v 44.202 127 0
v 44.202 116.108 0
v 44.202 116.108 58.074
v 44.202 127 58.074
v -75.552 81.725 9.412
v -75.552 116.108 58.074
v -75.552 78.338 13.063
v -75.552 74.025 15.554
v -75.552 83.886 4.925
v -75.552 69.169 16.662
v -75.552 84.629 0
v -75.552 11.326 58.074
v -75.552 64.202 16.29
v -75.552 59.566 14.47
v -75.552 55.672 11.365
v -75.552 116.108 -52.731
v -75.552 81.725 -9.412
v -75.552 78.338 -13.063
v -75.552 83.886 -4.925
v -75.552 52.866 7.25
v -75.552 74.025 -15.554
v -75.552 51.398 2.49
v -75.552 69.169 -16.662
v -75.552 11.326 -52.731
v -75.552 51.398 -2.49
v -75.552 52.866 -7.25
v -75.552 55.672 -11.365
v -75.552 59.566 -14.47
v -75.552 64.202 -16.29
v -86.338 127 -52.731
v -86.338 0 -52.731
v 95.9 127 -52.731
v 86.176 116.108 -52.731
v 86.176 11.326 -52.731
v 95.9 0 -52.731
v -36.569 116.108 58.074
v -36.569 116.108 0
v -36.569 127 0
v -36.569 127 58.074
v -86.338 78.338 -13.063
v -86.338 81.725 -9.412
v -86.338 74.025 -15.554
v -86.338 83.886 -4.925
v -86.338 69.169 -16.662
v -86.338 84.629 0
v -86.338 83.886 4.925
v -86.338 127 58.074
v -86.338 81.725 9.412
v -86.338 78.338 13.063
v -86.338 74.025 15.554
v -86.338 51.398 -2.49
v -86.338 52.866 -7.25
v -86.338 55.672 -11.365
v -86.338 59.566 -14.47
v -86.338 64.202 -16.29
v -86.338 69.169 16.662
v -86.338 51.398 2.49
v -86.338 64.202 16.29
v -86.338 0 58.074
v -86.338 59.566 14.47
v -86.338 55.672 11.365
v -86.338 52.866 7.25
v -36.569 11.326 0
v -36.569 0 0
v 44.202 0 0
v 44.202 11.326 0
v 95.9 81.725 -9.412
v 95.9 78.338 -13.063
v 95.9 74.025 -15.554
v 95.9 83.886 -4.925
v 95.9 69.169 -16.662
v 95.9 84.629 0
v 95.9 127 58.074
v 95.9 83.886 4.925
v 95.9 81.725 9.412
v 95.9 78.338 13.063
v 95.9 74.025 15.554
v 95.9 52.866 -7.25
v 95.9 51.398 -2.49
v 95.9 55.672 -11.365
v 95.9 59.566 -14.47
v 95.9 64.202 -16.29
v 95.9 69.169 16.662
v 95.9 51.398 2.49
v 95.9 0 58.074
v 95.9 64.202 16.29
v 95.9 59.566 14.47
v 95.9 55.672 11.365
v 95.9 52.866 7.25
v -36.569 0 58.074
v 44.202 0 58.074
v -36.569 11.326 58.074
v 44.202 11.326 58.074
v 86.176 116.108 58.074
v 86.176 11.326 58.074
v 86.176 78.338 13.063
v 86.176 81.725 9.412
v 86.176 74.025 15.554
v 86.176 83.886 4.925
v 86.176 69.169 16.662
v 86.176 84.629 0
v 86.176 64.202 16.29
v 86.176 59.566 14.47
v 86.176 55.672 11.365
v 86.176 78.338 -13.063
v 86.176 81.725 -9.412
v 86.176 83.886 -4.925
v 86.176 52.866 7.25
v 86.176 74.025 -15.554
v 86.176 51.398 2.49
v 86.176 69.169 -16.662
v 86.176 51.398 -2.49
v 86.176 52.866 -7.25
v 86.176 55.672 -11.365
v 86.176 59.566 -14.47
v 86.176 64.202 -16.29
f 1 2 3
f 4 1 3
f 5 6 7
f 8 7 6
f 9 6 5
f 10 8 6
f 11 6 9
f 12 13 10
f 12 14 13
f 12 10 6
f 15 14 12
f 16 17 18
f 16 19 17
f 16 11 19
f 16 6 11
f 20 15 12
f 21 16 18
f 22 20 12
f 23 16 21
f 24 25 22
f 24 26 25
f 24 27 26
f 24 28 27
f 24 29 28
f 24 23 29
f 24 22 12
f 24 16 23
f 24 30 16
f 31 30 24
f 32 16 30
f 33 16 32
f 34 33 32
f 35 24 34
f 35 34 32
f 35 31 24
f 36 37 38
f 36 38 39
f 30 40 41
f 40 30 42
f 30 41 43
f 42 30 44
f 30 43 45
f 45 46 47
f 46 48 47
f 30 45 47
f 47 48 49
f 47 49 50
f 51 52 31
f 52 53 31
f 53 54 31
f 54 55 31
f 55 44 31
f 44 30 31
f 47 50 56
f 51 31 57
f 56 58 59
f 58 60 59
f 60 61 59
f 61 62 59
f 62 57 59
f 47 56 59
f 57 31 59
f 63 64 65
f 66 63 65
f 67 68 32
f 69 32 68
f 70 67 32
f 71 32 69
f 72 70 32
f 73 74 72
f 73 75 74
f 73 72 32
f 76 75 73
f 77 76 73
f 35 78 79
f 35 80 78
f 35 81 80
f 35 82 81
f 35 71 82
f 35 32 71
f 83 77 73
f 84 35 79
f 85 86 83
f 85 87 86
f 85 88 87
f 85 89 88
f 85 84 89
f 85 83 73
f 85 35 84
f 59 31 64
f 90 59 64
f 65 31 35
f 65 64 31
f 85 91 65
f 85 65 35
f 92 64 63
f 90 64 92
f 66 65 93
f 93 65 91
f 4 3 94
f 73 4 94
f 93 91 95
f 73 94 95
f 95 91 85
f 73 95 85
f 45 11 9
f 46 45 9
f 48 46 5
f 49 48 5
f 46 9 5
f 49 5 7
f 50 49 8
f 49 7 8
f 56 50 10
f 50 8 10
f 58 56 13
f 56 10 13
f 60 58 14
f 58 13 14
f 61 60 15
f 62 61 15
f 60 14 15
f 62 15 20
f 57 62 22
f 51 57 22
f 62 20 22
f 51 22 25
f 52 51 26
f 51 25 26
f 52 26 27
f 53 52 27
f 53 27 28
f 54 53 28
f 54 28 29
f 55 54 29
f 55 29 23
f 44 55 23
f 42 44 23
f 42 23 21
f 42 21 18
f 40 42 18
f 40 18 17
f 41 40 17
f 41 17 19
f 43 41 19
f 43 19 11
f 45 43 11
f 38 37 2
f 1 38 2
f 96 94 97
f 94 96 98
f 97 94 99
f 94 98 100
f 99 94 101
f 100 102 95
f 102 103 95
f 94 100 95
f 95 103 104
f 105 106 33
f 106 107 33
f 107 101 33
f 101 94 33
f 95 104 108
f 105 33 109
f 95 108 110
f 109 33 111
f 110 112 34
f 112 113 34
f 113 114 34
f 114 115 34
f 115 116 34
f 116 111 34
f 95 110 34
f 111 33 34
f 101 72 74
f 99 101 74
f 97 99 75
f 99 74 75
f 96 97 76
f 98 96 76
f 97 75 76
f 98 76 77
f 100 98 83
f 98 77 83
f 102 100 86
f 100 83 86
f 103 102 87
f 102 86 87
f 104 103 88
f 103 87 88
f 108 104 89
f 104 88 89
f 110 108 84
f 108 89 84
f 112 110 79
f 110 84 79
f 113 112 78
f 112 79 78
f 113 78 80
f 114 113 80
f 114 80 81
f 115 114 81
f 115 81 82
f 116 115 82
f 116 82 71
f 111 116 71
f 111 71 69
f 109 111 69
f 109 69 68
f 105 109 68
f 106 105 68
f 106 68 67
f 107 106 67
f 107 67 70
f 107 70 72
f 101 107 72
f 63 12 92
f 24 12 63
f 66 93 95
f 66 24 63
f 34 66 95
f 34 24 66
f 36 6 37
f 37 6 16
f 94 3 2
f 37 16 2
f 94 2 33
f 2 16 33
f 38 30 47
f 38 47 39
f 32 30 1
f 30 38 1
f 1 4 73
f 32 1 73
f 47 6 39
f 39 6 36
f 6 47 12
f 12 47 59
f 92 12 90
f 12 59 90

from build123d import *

# Parameters (mm, degrees)
F0_W     = 182.2371855378
F0_H     = 110.8047105372
F1_DEPTH = 127
F2_W     = 80.7708539069
F2_H     = 63.6986494064
F3_DEPTH = 127.001
F4_W     = 161.728402134
F4_H     = 104.781774804
F5_DEPTH = 110.8057105372
F6_R     = 16.7086573523
F7_DEPTH = 182.2381855378


with BuildPart() as f1:
    # F0 (on Front) → F1 (new body)
    with BuildSketch(Plane.XZ):
        with Locations((4.7809146345, 2.6716869324)):
            Rectangle(F0_W, F0_H)
    extrude(amount=-F1_DEPTH)

    # F2 (on Front) → F3 (cut, through all)
    with BuildSketch(Plane.XZ):
        with Locations((3.8164127618, 31.8493247032)):
            Rectangle(F2_W, F2_H)
    extrude(amount=-F3_DEPTH, mode=Mode.SUBTRACT)

    # F4 (on face) → F5 (cut, through all)
    with BuildSketch(Plane(origin=(0, 0, -52.7306683362), x_dir=(1, 0, 0), z_dir=(0, 0, -1))):
        with Locations((5.3121293895, -63.7166202068)):
            Rectangle(F4_W, F4_H)
    extrude(amount=-F5_DEPTH, mode=Mode.SUBTRACT)

    # F6 (on face) → F7 (cut, through all)
    with BuildSketch(Plane.YZ.offset(95.8995074034)):
        with Locations((67.9201483727, 0)):
            Circle(F6_R)
    extrude(amount=-F7_DEPTH, mode=Mode.SUBTRACT)


solid = f1.part
